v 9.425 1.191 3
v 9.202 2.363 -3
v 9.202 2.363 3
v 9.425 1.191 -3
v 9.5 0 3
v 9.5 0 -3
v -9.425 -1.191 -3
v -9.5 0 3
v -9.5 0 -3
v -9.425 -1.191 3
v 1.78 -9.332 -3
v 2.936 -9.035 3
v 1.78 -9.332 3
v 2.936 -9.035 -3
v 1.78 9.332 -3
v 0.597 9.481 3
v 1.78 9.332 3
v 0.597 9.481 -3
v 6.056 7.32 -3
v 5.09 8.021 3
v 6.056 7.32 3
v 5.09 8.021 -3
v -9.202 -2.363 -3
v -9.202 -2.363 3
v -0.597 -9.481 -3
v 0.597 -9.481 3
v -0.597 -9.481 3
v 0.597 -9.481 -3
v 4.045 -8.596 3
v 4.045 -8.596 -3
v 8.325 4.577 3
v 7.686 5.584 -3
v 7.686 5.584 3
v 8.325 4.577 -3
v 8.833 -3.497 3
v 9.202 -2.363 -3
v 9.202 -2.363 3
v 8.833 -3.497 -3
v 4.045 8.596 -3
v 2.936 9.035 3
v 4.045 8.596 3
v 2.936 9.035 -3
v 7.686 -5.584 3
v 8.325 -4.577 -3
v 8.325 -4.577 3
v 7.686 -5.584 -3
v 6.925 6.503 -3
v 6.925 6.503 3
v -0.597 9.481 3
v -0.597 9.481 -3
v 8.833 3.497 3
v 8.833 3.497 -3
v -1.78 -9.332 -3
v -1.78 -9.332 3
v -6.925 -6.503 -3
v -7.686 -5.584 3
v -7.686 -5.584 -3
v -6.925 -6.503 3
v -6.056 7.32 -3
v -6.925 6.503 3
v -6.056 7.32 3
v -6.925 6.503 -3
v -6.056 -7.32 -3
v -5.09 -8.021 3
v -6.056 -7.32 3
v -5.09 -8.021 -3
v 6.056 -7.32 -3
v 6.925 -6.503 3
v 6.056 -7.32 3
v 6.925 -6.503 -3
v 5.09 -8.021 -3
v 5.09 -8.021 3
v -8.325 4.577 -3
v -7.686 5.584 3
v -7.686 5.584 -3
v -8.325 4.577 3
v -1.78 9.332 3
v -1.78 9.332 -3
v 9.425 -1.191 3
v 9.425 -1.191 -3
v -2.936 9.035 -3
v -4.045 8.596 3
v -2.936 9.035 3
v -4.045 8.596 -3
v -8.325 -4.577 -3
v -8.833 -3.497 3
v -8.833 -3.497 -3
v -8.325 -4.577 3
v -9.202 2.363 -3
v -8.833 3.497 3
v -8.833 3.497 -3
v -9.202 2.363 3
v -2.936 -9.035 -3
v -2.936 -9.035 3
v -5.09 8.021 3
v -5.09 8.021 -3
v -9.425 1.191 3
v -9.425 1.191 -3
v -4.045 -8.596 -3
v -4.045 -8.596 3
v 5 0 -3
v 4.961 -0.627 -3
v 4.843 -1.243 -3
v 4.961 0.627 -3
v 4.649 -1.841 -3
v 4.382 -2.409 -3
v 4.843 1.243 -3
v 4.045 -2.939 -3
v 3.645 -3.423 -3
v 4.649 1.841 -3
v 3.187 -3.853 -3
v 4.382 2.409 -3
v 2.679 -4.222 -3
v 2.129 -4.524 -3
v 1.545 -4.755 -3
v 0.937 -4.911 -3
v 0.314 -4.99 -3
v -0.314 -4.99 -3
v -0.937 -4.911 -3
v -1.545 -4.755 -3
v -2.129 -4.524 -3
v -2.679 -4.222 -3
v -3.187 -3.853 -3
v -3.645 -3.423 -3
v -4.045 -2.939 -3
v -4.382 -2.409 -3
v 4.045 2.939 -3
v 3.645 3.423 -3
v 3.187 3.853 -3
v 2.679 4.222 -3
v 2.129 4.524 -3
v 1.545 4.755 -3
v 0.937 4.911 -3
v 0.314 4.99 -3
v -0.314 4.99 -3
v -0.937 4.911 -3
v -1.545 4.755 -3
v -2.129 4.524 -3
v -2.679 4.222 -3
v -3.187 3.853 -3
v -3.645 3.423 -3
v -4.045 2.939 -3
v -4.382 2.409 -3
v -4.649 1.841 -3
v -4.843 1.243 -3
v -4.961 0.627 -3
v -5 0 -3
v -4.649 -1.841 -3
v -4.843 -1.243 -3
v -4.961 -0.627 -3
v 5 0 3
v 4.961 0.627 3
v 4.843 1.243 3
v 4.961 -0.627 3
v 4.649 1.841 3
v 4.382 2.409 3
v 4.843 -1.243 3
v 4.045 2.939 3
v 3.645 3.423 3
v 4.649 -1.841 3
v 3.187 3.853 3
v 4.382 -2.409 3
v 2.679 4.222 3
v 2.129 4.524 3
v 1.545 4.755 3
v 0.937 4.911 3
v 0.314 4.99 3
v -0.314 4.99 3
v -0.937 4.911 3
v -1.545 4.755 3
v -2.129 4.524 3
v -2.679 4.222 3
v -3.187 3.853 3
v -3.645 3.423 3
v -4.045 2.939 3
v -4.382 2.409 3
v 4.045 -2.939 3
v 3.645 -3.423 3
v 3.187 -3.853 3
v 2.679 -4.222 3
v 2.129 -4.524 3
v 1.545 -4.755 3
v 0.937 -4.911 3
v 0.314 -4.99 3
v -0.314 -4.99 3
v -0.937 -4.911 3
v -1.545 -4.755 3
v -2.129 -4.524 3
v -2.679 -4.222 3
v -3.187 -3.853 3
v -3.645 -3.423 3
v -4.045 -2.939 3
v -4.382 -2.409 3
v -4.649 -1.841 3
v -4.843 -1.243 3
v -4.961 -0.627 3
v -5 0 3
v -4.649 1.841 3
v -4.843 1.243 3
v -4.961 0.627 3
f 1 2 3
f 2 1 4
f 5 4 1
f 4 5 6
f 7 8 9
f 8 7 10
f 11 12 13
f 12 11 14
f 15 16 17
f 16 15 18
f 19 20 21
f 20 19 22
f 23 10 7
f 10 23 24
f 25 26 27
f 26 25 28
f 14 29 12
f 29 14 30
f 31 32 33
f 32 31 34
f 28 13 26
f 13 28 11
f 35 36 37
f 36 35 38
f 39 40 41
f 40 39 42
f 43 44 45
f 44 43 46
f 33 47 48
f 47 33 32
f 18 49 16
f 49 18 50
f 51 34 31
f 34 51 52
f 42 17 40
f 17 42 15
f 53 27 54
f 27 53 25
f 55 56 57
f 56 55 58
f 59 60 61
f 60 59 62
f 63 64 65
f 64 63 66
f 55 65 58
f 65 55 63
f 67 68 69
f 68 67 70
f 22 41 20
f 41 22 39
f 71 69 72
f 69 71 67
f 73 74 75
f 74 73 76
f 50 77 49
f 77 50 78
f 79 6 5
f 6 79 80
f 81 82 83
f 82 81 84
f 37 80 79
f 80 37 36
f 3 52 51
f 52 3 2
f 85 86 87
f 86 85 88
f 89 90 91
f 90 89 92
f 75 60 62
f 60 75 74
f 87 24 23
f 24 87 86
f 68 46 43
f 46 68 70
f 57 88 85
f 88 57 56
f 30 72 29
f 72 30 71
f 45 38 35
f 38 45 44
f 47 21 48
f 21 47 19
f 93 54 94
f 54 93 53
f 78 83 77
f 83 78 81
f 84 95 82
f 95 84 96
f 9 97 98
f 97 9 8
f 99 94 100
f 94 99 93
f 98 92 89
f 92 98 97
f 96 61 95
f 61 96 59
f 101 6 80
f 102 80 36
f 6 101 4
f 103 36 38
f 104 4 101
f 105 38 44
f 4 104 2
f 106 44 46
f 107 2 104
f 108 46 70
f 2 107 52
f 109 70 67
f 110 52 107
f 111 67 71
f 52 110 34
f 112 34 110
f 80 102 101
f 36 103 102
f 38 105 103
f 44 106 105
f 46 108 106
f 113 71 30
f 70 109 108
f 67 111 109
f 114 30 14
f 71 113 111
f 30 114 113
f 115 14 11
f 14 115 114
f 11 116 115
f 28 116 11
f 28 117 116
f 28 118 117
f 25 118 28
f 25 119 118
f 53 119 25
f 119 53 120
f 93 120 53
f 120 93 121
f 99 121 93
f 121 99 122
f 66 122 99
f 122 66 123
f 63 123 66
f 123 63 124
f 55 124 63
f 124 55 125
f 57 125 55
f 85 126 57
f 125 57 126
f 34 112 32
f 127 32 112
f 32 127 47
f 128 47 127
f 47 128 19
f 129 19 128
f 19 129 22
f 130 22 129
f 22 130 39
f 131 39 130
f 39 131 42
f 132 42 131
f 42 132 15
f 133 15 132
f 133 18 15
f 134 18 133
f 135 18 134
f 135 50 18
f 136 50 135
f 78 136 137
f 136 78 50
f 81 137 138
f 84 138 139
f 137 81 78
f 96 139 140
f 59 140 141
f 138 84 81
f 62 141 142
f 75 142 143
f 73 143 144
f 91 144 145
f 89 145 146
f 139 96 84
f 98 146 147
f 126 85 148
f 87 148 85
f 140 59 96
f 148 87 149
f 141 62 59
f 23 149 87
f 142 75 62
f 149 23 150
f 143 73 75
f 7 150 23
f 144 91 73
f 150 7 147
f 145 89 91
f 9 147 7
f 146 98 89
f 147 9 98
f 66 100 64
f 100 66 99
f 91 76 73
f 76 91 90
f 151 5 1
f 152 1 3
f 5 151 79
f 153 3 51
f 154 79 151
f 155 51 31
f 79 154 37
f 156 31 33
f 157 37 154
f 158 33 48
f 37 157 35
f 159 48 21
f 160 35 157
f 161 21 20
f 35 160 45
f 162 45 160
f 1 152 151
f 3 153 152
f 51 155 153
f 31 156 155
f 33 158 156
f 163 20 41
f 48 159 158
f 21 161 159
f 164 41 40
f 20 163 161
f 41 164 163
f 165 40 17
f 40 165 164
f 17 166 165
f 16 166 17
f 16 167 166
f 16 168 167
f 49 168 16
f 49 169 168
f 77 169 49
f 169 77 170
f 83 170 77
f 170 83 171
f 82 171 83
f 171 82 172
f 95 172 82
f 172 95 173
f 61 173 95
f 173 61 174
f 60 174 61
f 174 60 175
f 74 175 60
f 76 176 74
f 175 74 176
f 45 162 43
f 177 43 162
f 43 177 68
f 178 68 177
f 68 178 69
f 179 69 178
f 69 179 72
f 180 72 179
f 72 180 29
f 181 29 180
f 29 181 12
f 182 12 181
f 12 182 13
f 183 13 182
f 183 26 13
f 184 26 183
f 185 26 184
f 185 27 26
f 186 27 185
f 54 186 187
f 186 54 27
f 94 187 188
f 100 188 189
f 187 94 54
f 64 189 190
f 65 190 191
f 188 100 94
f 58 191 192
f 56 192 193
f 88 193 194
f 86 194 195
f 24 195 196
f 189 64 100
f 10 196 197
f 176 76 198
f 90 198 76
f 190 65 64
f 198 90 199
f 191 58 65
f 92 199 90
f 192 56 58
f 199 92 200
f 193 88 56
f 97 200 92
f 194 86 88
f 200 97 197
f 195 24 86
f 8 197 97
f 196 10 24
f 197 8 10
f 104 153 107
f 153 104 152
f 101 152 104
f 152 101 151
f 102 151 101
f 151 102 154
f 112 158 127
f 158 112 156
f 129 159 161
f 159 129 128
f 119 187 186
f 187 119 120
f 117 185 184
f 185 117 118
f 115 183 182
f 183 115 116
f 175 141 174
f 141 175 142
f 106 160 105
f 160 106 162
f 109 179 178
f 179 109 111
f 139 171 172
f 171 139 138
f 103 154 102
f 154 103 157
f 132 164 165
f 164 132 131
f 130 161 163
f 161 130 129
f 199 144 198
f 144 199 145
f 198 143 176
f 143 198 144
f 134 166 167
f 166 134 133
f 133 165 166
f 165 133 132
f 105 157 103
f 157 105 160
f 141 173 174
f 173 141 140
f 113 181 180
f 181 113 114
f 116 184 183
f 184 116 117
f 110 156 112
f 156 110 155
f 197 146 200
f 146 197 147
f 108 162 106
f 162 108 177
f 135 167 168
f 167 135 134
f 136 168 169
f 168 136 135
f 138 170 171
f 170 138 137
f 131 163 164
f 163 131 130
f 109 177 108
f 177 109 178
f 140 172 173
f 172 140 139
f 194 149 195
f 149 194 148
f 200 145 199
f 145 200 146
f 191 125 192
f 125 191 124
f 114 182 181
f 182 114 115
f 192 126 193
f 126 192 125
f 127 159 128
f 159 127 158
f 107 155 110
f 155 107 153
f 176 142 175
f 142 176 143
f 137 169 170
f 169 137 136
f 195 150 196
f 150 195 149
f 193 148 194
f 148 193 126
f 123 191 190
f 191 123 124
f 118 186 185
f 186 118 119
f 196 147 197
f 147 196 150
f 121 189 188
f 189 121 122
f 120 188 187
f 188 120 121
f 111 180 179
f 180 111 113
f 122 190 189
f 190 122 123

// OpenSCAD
$fn = 50;


difference() {
	union() {
		translate(v = [0, 0, -3.0000000000]) {
			cylinder(h = 6, r = 9.5000000000);
		}
	}
	union() {
		translate(v = [0, 0, -100.0000000000]) {
			cylinder(h = 200, r = 5.0000000000);
		}
	}
}
